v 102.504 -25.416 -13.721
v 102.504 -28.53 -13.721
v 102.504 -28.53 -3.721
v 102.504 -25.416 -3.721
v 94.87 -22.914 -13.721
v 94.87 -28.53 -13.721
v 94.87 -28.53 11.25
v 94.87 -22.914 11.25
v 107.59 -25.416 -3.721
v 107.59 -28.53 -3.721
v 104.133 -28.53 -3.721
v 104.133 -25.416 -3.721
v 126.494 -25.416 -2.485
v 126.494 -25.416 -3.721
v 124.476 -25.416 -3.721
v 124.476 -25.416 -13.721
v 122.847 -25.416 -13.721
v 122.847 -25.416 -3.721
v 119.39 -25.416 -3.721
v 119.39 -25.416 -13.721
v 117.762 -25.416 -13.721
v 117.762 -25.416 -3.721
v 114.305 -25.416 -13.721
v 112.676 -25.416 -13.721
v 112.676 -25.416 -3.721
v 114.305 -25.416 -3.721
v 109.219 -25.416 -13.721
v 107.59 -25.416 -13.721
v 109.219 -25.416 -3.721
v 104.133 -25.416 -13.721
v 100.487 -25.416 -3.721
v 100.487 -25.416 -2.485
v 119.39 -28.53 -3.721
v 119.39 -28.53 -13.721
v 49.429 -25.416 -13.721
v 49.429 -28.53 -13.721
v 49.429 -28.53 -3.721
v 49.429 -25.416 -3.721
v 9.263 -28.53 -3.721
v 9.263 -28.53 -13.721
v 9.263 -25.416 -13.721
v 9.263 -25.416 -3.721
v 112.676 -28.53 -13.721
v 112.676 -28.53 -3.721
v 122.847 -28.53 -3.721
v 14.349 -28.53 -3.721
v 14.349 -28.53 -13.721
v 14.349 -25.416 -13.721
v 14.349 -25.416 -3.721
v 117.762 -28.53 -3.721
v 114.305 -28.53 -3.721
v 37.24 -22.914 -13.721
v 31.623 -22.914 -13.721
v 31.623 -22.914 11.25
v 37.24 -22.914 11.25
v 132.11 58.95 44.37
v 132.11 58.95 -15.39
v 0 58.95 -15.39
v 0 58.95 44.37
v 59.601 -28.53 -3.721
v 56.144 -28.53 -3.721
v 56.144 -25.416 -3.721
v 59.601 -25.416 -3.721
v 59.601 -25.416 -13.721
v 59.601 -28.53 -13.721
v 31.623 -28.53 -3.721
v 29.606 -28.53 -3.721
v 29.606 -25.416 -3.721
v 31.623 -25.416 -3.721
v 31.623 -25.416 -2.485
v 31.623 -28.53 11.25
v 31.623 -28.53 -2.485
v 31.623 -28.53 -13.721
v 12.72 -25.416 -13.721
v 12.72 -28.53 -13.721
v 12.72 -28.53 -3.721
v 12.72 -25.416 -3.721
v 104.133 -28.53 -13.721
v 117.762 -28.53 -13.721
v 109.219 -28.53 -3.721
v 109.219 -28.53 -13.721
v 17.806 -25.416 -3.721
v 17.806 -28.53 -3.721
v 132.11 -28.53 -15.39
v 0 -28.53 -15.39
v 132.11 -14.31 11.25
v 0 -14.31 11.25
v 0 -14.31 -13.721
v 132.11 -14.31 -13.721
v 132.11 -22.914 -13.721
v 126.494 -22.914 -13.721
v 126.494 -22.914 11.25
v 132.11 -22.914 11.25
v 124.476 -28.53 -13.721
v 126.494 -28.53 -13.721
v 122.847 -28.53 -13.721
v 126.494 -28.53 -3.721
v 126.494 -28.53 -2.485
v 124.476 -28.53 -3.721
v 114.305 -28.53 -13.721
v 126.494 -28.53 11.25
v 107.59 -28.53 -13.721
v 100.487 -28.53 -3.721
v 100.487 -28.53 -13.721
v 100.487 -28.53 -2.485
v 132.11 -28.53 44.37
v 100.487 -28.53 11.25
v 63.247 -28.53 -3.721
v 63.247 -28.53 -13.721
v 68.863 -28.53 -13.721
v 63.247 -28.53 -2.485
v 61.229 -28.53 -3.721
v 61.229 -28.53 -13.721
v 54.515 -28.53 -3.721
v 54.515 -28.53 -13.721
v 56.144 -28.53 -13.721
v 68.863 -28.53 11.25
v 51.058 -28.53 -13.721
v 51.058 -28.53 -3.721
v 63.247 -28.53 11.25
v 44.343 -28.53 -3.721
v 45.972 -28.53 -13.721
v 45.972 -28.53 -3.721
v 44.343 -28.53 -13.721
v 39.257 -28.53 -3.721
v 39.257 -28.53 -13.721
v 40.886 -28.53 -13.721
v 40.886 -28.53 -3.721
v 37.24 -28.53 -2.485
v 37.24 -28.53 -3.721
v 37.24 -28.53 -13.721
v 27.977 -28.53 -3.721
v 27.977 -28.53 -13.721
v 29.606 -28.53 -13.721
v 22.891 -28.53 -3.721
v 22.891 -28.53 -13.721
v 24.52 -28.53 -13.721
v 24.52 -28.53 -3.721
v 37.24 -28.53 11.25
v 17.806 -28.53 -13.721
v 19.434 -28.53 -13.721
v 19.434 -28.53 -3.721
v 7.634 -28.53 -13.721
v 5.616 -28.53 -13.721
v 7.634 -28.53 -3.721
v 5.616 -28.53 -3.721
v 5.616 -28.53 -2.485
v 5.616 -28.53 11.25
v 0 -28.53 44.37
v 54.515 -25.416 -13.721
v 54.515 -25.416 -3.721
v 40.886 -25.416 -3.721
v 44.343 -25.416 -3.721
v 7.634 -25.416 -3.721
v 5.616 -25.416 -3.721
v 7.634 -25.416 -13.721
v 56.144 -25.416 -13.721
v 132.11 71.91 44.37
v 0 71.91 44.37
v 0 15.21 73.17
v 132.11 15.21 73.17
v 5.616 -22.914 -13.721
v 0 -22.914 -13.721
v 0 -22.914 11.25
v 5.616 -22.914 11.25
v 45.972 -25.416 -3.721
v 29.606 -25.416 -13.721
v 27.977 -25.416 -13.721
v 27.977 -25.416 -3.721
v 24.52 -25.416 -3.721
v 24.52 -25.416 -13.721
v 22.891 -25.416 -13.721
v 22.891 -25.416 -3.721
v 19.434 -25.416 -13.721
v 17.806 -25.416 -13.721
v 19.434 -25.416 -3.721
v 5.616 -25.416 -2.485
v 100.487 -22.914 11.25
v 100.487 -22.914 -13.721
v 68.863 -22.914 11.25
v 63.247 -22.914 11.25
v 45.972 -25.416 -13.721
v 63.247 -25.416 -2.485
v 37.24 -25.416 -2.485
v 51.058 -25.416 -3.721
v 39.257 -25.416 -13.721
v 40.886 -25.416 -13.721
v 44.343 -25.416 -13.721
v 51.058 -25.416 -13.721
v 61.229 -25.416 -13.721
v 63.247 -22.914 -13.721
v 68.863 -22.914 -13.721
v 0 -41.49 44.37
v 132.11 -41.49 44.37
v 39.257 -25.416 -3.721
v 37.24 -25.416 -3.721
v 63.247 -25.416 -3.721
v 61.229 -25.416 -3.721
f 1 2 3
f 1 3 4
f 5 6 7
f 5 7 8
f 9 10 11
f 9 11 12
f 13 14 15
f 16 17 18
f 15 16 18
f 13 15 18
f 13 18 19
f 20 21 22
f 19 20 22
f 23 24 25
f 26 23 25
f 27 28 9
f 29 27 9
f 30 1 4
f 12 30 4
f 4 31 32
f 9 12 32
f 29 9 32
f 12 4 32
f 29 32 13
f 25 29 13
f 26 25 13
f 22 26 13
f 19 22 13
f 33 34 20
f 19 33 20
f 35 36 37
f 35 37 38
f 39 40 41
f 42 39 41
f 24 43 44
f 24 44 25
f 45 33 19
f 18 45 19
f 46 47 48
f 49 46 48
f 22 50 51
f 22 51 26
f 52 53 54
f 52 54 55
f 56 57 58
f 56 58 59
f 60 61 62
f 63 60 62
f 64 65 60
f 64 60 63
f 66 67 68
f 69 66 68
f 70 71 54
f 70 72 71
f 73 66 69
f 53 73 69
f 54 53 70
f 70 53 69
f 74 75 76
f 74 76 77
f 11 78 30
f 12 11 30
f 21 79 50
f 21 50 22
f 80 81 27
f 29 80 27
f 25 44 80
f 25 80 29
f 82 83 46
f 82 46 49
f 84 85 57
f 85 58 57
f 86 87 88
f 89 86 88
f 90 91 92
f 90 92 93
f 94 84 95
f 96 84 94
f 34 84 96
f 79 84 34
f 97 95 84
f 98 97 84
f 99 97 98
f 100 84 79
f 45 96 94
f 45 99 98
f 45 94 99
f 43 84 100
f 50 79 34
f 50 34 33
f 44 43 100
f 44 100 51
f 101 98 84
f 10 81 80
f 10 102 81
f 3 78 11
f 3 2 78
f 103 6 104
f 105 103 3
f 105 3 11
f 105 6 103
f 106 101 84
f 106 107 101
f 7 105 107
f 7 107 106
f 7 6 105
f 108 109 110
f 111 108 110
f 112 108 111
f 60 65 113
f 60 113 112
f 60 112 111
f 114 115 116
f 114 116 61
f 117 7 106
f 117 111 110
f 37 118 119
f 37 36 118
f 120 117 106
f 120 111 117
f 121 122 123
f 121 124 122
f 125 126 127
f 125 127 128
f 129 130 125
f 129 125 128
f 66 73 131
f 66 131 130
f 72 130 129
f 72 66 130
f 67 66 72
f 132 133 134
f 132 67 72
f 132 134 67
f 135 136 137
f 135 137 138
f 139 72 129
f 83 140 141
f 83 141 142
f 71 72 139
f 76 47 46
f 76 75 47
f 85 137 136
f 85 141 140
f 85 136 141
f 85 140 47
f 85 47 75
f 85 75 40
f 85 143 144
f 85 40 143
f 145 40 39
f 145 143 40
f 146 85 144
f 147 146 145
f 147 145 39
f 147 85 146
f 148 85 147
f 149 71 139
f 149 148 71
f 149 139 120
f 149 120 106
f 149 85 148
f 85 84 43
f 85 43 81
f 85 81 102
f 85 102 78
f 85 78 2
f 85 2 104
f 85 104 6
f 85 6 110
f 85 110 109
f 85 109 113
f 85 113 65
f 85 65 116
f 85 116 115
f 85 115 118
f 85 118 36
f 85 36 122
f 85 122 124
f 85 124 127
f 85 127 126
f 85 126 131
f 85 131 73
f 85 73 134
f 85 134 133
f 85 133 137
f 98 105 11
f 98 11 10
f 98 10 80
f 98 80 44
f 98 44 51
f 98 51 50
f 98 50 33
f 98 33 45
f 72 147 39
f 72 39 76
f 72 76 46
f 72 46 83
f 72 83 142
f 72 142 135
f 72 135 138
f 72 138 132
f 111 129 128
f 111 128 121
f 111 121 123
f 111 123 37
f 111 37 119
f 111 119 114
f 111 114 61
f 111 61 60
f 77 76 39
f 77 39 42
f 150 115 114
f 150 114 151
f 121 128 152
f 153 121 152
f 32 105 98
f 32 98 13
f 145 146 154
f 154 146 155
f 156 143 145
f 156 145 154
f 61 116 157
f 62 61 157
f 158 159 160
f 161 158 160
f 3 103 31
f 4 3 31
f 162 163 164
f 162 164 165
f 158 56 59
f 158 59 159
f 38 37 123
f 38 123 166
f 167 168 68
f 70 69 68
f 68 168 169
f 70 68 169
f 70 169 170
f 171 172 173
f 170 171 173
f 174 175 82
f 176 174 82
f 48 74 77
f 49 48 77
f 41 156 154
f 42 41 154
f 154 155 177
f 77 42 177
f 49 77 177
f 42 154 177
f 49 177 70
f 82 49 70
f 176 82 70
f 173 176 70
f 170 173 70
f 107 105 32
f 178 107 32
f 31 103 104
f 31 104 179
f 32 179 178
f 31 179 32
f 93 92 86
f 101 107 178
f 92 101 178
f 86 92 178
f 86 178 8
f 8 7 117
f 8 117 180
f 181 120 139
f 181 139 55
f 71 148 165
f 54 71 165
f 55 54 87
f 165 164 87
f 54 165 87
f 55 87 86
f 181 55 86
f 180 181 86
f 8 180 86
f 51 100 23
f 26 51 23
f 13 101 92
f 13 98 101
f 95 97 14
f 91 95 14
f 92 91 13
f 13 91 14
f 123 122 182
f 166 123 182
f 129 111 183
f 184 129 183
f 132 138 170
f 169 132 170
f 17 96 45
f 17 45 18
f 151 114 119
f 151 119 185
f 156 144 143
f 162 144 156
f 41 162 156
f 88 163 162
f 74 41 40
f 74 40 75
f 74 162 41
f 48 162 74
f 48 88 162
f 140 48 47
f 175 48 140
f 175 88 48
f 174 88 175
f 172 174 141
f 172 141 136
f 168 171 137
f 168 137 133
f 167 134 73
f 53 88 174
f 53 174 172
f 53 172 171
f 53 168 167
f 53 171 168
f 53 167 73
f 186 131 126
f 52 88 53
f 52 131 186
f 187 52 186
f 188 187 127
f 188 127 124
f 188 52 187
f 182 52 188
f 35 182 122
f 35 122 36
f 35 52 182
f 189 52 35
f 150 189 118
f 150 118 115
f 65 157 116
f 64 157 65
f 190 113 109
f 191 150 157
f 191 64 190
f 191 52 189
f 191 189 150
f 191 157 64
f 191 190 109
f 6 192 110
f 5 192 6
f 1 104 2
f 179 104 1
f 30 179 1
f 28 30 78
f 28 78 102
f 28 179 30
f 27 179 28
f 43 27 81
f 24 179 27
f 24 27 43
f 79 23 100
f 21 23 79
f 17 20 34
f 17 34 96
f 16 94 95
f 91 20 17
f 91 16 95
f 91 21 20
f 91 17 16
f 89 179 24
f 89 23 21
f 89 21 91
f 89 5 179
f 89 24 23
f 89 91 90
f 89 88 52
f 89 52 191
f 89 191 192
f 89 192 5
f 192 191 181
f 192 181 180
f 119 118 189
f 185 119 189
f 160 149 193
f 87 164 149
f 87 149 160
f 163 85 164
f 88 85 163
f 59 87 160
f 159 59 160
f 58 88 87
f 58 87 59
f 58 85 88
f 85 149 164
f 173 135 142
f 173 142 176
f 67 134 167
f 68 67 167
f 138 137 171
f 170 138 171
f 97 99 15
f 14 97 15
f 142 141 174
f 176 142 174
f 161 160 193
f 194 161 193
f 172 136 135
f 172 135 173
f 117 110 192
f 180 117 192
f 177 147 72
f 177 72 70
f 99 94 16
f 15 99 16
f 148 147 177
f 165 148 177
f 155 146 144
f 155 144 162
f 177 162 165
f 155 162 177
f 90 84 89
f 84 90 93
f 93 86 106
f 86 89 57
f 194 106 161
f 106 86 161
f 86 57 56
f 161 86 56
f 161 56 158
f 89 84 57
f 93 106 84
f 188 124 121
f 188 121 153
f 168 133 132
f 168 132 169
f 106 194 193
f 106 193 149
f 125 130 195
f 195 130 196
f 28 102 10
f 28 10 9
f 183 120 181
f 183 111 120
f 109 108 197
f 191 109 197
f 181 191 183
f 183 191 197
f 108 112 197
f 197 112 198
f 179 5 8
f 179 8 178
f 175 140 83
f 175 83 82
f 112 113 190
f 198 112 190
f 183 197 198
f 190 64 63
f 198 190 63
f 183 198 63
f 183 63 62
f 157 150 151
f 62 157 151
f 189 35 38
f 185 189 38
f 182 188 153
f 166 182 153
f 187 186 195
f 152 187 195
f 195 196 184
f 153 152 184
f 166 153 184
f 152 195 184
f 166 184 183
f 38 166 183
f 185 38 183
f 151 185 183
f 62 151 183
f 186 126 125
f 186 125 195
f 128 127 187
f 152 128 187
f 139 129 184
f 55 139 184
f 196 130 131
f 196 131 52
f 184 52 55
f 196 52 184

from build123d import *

# Parameters (mm, degrees)
F1_DEPTH  = 132.11009
F2_W      = 132.11009
F2_H      = 1.6692737117
F3_DEPTH  = 14.2200058326
F4_W      = 5.6164497176
F4_H      = 5.6164497176
F5_DEPTH  = 24.97072611
F4_W_2    = 1.6288390616
F4_H_2    = 3.1137447804
F6_DEPTH  = 10
F7_W      = 3.1137447804
F7_H      = 1.2358725164
F8_DEPTH  = 57.6303704236
F9_W      = 3.1137447804
F9_H      = 1.2358725164
F10_DEPTH = 26.006960353


with BuildPart() as f1:
    # F0 (on Right) → F1 (new body)
    with BuildSketch(Plane.YZ):
        Polygon((-41.4899997413, 44.3699993193), (-28.5300053656, 44.3699993193), (58.9500032365, 44.3699993193), (71.9099976122, 44.3699993193), (15.2099989355, 73.1699988246), align=None)
        Polygon((-14.309999533, 11.2499995157), (-14.309999533, -15.3900003061), (58.9500032365, -15.3900003061), (58.9500032365, 44.3699993193), (-28.5300053656, 44.3699993193), (-28.5300053656, 11.2499995157), align=None)
    extrude(amount=F1_DEPTH)

    # F2 (on face) → F3 (join, through all)
    with BuildSketch(Plane.XZ.offset(14.309999533)):
        with Locations((66.055045, -14.5553634502)):
            Rectangle(F2_W, F2_H)
    extrude(amount=F3_DEPTH)

    # F4 (on face) → F5 (join, through all)
    with BuildSketch(Plane.XY.offset(-13.7207265943)):
        with Locations((2.8082248588, -25.7217805068)):
            Rectangle(F4_W, F4_H)
        with Locations((34.4316349294, -25.7217805068)):
            Rectangle(F4_W, F4_H)
        with Locations((66.055045, -25.7217805068)):
            Rectangle(F4_W, F4_H)
        with Locations((97.6784550706, -25.7217805068)):
            Rectangle(F4_W, F4_H)
        with Locations((129.3018651412, -25.7217805068)):
            Rectangle(F4_W, F4_H)
    extrude(amount=F5_DEPTH)

    # F4 (on face) → F6 (join)
    with BuildSketch(Plane.XY.offset(-13.7207265943)):
        with Locations((2.8082248588, -25.7217805068)):
            Rectangle(F4_W, F4_H)
        with Locations((34.4316349294, -25.7217805068)):
            Rectangle(F4_W, F4_H)
        with Locations((66.055045, -25.7217805068)):
            Rectangle(F4_W, F4_H)
        with Locations((97.6784550706, -25.7217805068)):
            Rectangle(F4_W, F4_H)
        with Locations((129.3018651412, -25.7217805068)):
            Rectangle(F4_W, F4_H)
        with Locations((8.4482542712, -26.9731329754)):
            Rectangle(F4_W_2, F4_H_2)
        with Locations((13.5340920827, -26.9731329754)):
            Rectangle(F4_W_2, F4_H_2)
        with Locations((18.6199298941, -26.9731329754)):
            Rectangle(F4_W_2, F4_H_2)
        with Locations((23.7057677055, -26.9731329754)):
            Rectangle(F4_W_2, F4_H_2)
        with Locations((28.791605517, -26.9731329754)):
            Rectangle(F4_W_2, F4_H_2)
        with Locations((45.1575021533, -26.9731329754)):
            Rectangle(F4_W_2, F4_H_2)
        with Locations((50.2433399647, -26.9731329754)):
            Rectangle(F4_W_2, F4_H_2)
        with Locations((55.3291777761, -26.9731329754)):
            Rectangle(F4_W_2, F4_H_2)
        with Locations((60.4150155876, -26.9731329754)):
            Rectangle(F4_W_2, F4_H_2)
        with Locations((40.0716643418, -26.9731329754)):
            Rectangle(F4_W_2, F4_H_2)
        with Locations((108.4043222945, -26.9731329754)):
            Rectangle(F4_W_2, F4_H_2)
        with Locations((113.4901601059, -26.9731329754)):
            Rectangle(F4_W_2, F4_H_2)
        with Locations((118.5759979173, -26.9731329754)):
            Rectangle(F4_W_2, F4_H_2)
        with Locations((123.6618357288, -26.9731329754)):
            Rectangle(F4_W_2, F4_H_2)
        with Locations((103.318484483, -26.9731329754)):
            Rectangle(F4_W_2, F4_H_2)
    extrude(amount=F6_DEPTH)

    # F7 (on face) → F8 (join, through all)
    with BuildSketch(Plane.YZ.offset(5.6164497176)):
        with Locations((-26.9731329754, -3.1027903361)):
            Rectangle(F7_W, F7_H)
    extrude(amount=F8_DEPTH)

    # F9 (on face) → F10 (join, through all)
    with BuildSketch(Plane.YZ.offset(100.4866799294)):
        with Locations((-26.9731329754, -3.1027903361)):
            Rectangle(F9_W, F9_H)
    extrude(amount=F10_DEPTH)


solid = f1.part
